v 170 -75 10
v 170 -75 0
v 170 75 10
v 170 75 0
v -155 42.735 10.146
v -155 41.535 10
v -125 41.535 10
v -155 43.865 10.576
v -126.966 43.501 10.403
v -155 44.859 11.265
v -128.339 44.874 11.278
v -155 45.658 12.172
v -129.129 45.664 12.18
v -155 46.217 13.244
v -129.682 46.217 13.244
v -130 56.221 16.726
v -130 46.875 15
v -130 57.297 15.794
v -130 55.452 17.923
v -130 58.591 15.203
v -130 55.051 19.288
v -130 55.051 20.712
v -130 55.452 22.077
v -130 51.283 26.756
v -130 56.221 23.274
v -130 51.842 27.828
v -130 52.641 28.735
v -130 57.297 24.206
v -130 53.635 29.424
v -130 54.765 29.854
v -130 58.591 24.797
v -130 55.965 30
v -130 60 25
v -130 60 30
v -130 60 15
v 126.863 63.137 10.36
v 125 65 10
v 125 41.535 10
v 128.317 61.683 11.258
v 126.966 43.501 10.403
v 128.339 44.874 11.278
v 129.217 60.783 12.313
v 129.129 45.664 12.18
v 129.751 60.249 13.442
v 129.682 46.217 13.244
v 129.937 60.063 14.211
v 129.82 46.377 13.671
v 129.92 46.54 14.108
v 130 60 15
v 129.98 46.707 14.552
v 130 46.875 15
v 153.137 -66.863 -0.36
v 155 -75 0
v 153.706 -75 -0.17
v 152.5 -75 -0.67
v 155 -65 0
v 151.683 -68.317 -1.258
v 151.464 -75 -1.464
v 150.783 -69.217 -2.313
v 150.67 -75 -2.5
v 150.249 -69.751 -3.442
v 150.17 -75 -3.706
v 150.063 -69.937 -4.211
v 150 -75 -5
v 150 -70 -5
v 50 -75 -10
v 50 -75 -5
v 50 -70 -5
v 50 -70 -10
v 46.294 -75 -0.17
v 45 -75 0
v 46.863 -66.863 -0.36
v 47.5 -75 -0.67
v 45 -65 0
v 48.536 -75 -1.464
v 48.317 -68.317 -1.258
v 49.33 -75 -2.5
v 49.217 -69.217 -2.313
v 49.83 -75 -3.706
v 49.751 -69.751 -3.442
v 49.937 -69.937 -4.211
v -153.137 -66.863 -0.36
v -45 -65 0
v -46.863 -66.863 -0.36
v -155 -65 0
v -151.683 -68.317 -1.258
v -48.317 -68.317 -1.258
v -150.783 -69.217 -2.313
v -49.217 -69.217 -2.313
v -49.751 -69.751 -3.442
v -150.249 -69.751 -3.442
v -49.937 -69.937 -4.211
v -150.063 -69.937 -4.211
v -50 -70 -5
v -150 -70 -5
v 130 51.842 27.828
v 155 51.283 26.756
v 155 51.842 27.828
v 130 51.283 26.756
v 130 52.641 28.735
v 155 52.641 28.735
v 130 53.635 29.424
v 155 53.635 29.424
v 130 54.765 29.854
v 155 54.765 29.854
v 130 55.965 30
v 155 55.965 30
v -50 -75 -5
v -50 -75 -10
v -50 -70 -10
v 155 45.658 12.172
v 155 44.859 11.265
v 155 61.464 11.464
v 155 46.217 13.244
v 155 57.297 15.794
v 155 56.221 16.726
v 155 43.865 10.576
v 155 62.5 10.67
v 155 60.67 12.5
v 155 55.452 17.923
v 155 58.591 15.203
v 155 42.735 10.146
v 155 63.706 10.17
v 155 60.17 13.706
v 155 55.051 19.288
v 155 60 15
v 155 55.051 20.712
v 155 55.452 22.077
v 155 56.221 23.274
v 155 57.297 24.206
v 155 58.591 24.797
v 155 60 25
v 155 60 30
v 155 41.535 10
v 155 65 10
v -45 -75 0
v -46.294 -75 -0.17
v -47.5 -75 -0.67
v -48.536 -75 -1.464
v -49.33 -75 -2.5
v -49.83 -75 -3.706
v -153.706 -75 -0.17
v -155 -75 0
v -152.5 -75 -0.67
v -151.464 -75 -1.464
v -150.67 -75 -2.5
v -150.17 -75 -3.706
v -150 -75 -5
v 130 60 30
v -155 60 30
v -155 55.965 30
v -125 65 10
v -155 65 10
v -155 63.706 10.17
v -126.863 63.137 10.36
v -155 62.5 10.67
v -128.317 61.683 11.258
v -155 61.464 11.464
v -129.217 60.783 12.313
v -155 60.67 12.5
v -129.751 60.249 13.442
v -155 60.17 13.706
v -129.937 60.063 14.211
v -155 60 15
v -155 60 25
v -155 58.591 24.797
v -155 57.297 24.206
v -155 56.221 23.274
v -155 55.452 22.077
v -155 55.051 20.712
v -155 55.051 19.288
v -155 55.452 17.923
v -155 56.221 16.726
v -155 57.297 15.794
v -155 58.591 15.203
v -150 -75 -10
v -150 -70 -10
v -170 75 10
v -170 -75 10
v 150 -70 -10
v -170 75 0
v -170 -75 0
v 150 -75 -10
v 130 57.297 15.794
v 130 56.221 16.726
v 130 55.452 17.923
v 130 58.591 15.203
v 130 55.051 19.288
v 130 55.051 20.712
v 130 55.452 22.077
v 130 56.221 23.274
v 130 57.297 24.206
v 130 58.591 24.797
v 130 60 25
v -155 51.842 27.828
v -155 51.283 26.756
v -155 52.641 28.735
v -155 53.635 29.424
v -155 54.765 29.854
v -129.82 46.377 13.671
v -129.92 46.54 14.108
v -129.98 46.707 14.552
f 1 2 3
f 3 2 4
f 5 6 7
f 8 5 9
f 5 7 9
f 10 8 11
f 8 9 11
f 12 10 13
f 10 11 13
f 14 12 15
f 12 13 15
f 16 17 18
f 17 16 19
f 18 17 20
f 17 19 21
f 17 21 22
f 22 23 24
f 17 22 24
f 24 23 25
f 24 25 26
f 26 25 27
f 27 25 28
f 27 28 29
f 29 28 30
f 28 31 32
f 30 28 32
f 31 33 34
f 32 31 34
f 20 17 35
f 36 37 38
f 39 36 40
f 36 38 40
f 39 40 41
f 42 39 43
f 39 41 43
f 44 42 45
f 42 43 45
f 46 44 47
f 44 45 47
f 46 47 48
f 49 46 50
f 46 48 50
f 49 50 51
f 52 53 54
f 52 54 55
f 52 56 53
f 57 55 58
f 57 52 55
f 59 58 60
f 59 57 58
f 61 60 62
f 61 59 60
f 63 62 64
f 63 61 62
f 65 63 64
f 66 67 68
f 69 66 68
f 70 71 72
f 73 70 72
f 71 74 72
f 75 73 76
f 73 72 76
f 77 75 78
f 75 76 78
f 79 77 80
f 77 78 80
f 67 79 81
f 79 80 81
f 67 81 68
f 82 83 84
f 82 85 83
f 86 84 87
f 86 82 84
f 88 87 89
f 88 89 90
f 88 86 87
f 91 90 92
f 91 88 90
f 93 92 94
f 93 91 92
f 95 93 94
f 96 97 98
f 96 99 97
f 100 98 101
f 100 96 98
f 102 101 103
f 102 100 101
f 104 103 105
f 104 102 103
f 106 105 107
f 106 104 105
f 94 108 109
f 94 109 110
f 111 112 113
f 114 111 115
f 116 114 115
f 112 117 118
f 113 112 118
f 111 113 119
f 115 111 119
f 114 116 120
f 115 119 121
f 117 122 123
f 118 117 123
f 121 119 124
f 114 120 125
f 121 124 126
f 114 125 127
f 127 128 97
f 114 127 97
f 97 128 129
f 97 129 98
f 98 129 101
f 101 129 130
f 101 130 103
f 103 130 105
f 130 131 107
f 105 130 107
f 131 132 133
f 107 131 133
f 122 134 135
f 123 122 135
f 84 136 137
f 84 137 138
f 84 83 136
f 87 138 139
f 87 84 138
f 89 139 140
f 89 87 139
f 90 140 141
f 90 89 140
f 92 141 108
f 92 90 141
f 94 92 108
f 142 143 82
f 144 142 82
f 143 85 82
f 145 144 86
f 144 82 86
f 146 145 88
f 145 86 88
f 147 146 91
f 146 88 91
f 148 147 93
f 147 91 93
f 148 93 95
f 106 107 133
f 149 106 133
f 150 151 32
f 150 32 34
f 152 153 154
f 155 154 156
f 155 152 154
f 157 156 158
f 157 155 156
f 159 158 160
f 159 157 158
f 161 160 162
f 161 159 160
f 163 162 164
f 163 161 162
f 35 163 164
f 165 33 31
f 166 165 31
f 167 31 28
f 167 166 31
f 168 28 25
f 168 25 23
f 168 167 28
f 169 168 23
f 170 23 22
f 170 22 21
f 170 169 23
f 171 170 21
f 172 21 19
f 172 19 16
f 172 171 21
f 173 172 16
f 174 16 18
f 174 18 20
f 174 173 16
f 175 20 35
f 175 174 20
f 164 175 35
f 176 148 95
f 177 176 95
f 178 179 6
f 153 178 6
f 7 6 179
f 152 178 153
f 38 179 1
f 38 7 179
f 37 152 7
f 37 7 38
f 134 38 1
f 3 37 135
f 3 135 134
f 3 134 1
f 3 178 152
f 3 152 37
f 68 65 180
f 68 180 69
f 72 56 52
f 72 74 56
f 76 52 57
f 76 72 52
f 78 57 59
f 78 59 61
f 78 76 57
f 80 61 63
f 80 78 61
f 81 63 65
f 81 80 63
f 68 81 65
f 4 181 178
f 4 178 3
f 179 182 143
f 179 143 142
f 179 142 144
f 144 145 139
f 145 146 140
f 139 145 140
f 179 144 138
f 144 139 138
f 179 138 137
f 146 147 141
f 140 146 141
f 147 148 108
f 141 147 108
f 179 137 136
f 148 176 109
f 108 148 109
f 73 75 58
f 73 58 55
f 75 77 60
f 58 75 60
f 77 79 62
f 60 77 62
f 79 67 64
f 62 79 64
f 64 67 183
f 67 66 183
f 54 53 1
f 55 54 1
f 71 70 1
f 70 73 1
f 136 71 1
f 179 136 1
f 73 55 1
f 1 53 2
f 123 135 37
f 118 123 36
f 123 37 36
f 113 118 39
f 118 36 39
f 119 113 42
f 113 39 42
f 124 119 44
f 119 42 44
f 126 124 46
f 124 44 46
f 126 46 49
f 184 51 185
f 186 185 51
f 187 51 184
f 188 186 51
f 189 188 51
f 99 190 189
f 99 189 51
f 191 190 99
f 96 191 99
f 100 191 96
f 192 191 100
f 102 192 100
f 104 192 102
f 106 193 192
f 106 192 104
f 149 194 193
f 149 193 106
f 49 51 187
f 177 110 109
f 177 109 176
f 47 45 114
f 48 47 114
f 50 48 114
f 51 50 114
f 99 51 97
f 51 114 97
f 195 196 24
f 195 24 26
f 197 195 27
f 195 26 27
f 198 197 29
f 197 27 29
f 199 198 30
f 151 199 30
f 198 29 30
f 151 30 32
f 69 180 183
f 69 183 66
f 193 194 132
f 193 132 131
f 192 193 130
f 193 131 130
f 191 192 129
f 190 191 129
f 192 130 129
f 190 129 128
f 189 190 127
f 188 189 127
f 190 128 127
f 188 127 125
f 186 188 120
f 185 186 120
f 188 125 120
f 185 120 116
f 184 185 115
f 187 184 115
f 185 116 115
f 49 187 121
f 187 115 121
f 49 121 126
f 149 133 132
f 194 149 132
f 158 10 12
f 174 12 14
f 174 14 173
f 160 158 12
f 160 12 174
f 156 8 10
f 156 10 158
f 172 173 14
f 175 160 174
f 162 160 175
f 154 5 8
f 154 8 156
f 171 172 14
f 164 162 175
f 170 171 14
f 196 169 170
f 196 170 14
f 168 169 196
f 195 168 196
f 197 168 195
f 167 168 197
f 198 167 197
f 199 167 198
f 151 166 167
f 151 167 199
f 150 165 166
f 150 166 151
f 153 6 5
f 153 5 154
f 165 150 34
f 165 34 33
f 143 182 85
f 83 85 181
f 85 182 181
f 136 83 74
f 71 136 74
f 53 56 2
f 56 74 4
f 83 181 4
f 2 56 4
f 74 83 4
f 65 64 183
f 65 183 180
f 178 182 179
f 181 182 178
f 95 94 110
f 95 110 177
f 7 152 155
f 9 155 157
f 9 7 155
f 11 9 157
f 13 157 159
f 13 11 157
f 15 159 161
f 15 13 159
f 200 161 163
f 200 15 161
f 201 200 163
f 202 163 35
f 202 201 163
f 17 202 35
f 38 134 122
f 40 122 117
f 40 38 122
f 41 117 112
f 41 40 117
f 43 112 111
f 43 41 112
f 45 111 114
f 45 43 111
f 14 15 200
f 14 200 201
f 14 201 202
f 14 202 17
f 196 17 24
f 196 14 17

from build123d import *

# Parameters (mm, degrees)
SKETCH1_W                                     = 340
SKETCH1_H                                     = 150
VERTICAL_PORTION_DEPTH                        = 10
SHAFT_ADAPTER_RIGHT_DEPTH                     = 25
SHAFT_ADAPTER_FILLETS_R                       = 5
SKETCH5_W                                     = 100
SKETCH5_H                                     = 5
LIMIT_TAB_PREVENTS_GATE_FROM_GETTING_PU_DEPTH = 10
LIMIT_TAB_FILLETS_R                           = 5


with BuildPart() as part:
    # Sketch1 → Vertical portion (new body)
    with BuildSketch(Plane.XY):
        Rectangle(SKETCH1_W, SKETCH1_H)
    extrude(amount=VERTICAL_PORTION_DEPTH)

    # Sketch4 → Shaft adapter right (add)
    with BuildSketch(Plane(origin=(155, 0, 0), x_dir=(0, 0, -1), z_dir=(1, 0, 0))):
        with BuildLine():
            Line((-10, 45), (-30, 52.5))
            Line((-30, 52.5), (-30, 60))
            Line((-30, 60), (-25, 60))
            ThreePointArc((-25, 60), (-20, 55), (-15, 60))
            Line((-15, 60), (-10, 60))
            Line((-10, 60), (-10, 55))
            Line((-10, 55), (-10, 45))
        make_face()
    shaft_adapter_right = extrude(amount=-SHAFT_ADAPTER_RIGHT_DEPTH)

    # Shaft adapter left: Shaft adapter right across plane
    add(shaft_adapter_right.mirror(Plane(origin=(0, 0, 0), x_dir=(0, 0, 1), z_dir=(1, 0, 0))))

    # Shaft adapter fillets
    shaft_adapter_fillets_edges = [part.edges().sort_by_distance(p)[0] for p in [
        (-142.5, 52.5, 30),
        (142.5, 52.5, 30),
        (130, 52.5, 10),
        (-130, 52.5, 10),
        (-142.5, 45, 10),
        (142.5, 45, 10),
        (142.5, 60, 10),
        (-142.5, 60, 10),
    ]]
    fillet(shaft_adapter_fillets_edges, radius=SHAFT_ADAPTER_FILLETS_R - 0.0001)  # a hair under: the kernel refuses the full size

    # Sketch5 → Limit tab (prevents gate from getting pushed out of slot) (add)
    with BuildSketch(Plane(origin=(0, 0, 0), x_dir=(-1, 0, 0), z_dir=(0, 0, -1))):
        with Locations((-100, -72.5)):
            Rectangle(SKETCH5_W, SKETCH5_H)
        with Locations((100, -72.5)):
            Rectangle(SKETCH5_W, SKETCH5_H)
    extrude(amount=LIMIT_TAB_PREVENTS_GATE_FROM_GETTING_PU_DEPTH)

    # Limit tab fillets
    limit_tab_fillets_edges = [part.edges().sort_by_distance(p)[0] for p in [
        (150, -72.5, 0),
        (50, -72.5, 0),
        (100, -70, 0),
        (-150, -72.5, 0),
        (-100, -70, 0),
        (-50, -72.5, 0),
    ]]
    fillet(limit_tab_fillets_edges, radius=LIMIT_TAB_FILLETS_R)


solid = part.part
